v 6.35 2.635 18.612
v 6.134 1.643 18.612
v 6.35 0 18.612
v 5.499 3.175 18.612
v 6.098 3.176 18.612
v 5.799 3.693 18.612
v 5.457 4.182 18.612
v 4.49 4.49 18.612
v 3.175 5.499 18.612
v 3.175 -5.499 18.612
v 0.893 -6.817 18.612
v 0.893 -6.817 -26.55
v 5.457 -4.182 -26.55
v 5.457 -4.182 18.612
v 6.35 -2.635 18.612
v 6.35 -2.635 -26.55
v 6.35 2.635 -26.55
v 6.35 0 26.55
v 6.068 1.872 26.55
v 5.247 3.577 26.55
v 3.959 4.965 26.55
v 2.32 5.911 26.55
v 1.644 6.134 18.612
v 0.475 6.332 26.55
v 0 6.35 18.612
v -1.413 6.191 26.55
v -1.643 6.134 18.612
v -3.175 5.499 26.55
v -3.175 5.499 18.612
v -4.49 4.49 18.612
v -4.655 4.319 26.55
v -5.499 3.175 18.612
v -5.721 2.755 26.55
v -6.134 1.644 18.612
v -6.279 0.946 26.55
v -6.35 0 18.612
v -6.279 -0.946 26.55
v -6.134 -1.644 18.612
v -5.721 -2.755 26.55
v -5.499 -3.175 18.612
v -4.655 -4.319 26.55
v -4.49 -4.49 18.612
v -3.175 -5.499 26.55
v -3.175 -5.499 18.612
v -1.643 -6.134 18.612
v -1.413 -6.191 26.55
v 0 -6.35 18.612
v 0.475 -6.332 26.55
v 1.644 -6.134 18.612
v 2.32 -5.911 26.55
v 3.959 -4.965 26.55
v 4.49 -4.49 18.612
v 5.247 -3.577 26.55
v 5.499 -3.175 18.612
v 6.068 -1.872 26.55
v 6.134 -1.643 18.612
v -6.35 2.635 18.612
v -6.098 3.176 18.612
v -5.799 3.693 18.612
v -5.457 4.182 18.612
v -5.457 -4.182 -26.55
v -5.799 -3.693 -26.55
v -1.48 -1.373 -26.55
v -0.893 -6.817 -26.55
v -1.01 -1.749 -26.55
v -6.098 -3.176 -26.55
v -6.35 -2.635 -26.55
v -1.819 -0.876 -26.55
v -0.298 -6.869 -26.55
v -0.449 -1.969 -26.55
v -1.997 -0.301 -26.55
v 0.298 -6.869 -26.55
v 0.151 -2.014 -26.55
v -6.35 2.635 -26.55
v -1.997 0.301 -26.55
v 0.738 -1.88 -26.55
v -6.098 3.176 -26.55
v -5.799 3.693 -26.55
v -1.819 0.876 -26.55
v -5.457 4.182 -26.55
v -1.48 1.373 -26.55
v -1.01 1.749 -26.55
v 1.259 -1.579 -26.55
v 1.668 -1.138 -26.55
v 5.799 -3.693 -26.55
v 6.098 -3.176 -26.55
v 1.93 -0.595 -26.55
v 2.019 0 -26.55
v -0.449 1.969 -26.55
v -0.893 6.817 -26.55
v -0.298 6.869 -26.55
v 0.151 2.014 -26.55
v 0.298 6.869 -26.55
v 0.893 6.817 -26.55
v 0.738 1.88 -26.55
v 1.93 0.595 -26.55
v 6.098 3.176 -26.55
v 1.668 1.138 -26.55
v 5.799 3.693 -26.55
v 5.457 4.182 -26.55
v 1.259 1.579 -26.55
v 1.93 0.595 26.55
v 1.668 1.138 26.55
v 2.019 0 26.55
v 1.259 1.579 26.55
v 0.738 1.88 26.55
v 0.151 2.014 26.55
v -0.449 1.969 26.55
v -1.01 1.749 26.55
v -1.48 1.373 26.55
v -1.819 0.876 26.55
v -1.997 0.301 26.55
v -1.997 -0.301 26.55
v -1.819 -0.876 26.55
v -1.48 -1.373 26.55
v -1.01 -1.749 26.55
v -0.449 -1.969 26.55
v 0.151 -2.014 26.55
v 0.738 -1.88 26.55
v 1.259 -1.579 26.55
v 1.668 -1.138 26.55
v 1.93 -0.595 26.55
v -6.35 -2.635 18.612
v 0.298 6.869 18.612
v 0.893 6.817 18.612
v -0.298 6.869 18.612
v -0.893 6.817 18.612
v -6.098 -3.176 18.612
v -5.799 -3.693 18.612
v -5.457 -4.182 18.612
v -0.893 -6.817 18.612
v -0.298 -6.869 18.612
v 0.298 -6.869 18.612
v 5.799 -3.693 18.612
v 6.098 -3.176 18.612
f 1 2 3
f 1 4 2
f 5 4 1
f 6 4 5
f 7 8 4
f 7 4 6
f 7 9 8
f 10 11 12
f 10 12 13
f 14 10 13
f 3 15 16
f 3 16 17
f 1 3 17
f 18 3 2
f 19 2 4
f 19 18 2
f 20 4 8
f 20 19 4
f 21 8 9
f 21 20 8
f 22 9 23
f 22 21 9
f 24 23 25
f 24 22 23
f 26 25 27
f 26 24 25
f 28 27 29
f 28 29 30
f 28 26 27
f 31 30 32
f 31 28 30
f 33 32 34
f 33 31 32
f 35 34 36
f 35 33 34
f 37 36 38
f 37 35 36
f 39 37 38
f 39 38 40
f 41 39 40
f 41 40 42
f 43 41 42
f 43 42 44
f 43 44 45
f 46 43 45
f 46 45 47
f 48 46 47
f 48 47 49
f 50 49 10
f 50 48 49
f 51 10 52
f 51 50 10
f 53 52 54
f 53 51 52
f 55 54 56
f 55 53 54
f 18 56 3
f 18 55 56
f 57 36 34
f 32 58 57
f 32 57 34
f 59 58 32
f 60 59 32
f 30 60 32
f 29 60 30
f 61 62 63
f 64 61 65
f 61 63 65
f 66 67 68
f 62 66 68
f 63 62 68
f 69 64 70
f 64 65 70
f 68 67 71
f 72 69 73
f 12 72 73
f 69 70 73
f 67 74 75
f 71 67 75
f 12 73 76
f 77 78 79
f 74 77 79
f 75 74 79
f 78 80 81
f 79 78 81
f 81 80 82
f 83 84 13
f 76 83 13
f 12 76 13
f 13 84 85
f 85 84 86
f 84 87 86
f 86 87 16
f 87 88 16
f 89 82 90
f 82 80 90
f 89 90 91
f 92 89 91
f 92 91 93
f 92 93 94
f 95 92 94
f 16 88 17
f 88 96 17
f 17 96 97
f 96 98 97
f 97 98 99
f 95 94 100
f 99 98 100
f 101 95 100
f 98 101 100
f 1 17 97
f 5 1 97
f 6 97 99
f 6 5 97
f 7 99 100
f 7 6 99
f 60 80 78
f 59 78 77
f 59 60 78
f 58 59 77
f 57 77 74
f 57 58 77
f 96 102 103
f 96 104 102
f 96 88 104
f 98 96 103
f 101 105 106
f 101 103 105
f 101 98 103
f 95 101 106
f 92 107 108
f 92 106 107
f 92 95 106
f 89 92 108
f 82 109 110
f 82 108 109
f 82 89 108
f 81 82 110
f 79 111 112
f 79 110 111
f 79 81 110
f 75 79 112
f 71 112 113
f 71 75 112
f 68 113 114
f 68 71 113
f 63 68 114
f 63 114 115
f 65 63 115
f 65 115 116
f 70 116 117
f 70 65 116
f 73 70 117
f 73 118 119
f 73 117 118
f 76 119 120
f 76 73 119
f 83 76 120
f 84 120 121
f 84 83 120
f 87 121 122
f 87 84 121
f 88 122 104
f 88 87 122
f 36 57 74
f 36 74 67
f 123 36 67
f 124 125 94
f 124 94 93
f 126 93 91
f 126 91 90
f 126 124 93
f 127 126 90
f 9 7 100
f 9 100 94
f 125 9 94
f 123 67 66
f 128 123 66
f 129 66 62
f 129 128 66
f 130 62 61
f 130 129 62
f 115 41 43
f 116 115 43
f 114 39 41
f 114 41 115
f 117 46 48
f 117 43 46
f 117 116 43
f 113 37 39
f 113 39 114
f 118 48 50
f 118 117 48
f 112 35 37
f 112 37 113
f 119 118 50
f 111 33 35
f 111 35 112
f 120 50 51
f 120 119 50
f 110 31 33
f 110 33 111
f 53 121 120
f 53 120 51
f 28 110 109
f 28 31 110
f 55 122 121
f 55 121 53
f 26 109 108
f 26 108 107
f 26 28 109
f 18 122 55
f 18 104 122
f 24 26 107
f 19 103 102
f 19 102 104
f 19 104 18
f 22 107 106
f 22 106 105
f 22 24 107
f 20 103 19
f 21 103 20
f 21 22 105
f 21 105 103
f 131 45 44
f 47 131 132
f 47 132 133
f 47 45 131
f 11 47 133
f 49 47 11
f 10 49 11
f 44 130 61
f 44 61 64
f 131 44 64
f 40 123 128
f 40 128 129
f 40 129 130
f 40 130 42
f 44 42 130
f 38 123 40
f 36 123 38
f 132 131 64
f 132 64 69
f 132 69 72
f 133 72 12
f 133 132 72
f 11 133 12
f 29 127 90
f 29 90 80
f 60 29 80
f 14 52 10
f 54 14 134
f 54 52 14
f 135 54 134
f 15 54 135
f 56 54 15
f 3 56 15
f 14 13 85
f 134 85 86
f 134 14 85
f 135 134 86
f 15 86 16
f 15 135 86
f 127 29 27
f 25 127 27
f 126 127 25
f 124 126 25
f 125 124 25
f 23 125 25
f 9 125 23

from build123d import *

# Parameters (mm, degrees)
SKETCH1_R                            = 2.0193
BOSS_EXTRUDE1_DEPTH                  = 26.549999986
F_10_32_TAPPED_HOLE1_D               = 4.0386
F_10_32_TAPPED_HOLE1_DEPTH           = 12.02944
F_10_32_TAPPED_HOLE1_TIP             = 1.213317848
F_10_32_TAPPED_HOLE1_ON_FACE_2_D     = 4.0386
F_10_32_TAPPED_HOLE1_ON_FACE_2_DEPTH = 12.02944
F_10_32_TAPPED_HOLE1_ON_FACE_2_TIP   = 1.213317848
SKETCH5_R                            = 6.874999966
SKETCH5_R_2                          = 6.35
CUT_EXTRUDE1_DEPTH                   = 7.9375


with BuildPart() as part:
    # Sketch1 → Boss-Extrude1 (new, symmetric)
    with BuildSketch(Plane.XY):
        with BuildLine():
            ThreePointArc((0.893039571, 6.816751782), (0, 6.874999966), (-0.893039571, 6.816751782))
            Line((-0.893039571, 6.816751782), (-5.456960429, 4.181770846))
            ThreePointArc((-5.456960429, 4.181770846), (-5.953924622, 3.437499983), (-6.35, 2.634980936))
            Line((-6.35, 2.634980936), (-6.35, -2.634980936))
            ThreePointArc((-6.35, -2.634980936), (-5.953924622, -3.437499983), (-5.456960429, -4.181770846))
            Line((-5.456960429, -4.181770846), (-0.893039571, -6.816751782))
            ThreePointArc((-0.893039571, -6.816751782), (0, -6.874999966), (0.893039571, -6.816751782))
            Line((0.893039571, -6.816751782), (5.456960429, -4.181770846))
            ThreePointArc((5.456960429, -4.181770846), (5.953924622, -3.437499983), (6.35, -2.634980936))
            Line((6.35, -2.634980936), (6.35, 2.634980936))
            ThreePointArc((6.35, 2.634980936), (5.953924622, 3.437499983), (5.456960429, 4.181770846))
            Line((5.456960429, 4.181770846), (0.893039571, 6.816751782))
        make_face()
        Circle(SKETCH1_R, mode=Mode.SUBTRACT)
    extrude(amount=BOSS_EXTRUDE1_DEPTH, both=True)

    # #10-32 Tapped Hole1
    with Locations(Plane.XY.offset(26.549999986)):
        with Locations((0, 0)):
            Hole(F_10_32_TAPPED_HOLE1_D / 2, depth=F_10_32_TAPPED_HOLE1_DEPTH)
            with Locations((0, 0, -(F_10_32_TAPPED_HOLE1_DEPTH + F_10_32_TAPPED_HOLE1_TIP / 2))):  # 118° drill point
                Cone(0, F_10_32_TAPPED_HOLE1_D / 2, F_10_32_TAPPED_HOLE1_TIP, mode=Mode.SUBTRACT)

    # #10-32 Tapped Hole1 on face 2
    with Locations(Plane.XY.offset(-26.549999986)):
        with Locations((0, 0)):
            Hole(F_10_32_TAPPED_HOLE1_ON_FACE_2_D / 2, depth=F_10_32_TAPPED_HOLE1_ON_FACE_2_DEPTH)
            with Locations((0, 0, -(F_10_32_TAPPED_HOLE1_ON_FACE_2_DEPTH + F_10_32_TAPPED_HOLE1_ON_FACE_2_TIP / 2))):  # 118° drill point
                Cone(0, F_10_32_TAPPED_HOLE1_ON_FACE_2_D / 2, F_10_32_TAPPED_HOLE1_ON_FACE_2_TIP, mode=Mode.SUBTRACT)

    # Sketch5 → Cut-Extrude1 (cut)
    with BuildSketch(Plane.XY.offset(26.549999986)):
        Circle(SKETCH5_R)
        Circle(SKETCH5_R_2, mode=Mode.SUBTRACT)
    extrude(amount=-CUT_EXTRUDE1_DEPTH, mode=Mode.SUBTRACT)


solid = part.part
